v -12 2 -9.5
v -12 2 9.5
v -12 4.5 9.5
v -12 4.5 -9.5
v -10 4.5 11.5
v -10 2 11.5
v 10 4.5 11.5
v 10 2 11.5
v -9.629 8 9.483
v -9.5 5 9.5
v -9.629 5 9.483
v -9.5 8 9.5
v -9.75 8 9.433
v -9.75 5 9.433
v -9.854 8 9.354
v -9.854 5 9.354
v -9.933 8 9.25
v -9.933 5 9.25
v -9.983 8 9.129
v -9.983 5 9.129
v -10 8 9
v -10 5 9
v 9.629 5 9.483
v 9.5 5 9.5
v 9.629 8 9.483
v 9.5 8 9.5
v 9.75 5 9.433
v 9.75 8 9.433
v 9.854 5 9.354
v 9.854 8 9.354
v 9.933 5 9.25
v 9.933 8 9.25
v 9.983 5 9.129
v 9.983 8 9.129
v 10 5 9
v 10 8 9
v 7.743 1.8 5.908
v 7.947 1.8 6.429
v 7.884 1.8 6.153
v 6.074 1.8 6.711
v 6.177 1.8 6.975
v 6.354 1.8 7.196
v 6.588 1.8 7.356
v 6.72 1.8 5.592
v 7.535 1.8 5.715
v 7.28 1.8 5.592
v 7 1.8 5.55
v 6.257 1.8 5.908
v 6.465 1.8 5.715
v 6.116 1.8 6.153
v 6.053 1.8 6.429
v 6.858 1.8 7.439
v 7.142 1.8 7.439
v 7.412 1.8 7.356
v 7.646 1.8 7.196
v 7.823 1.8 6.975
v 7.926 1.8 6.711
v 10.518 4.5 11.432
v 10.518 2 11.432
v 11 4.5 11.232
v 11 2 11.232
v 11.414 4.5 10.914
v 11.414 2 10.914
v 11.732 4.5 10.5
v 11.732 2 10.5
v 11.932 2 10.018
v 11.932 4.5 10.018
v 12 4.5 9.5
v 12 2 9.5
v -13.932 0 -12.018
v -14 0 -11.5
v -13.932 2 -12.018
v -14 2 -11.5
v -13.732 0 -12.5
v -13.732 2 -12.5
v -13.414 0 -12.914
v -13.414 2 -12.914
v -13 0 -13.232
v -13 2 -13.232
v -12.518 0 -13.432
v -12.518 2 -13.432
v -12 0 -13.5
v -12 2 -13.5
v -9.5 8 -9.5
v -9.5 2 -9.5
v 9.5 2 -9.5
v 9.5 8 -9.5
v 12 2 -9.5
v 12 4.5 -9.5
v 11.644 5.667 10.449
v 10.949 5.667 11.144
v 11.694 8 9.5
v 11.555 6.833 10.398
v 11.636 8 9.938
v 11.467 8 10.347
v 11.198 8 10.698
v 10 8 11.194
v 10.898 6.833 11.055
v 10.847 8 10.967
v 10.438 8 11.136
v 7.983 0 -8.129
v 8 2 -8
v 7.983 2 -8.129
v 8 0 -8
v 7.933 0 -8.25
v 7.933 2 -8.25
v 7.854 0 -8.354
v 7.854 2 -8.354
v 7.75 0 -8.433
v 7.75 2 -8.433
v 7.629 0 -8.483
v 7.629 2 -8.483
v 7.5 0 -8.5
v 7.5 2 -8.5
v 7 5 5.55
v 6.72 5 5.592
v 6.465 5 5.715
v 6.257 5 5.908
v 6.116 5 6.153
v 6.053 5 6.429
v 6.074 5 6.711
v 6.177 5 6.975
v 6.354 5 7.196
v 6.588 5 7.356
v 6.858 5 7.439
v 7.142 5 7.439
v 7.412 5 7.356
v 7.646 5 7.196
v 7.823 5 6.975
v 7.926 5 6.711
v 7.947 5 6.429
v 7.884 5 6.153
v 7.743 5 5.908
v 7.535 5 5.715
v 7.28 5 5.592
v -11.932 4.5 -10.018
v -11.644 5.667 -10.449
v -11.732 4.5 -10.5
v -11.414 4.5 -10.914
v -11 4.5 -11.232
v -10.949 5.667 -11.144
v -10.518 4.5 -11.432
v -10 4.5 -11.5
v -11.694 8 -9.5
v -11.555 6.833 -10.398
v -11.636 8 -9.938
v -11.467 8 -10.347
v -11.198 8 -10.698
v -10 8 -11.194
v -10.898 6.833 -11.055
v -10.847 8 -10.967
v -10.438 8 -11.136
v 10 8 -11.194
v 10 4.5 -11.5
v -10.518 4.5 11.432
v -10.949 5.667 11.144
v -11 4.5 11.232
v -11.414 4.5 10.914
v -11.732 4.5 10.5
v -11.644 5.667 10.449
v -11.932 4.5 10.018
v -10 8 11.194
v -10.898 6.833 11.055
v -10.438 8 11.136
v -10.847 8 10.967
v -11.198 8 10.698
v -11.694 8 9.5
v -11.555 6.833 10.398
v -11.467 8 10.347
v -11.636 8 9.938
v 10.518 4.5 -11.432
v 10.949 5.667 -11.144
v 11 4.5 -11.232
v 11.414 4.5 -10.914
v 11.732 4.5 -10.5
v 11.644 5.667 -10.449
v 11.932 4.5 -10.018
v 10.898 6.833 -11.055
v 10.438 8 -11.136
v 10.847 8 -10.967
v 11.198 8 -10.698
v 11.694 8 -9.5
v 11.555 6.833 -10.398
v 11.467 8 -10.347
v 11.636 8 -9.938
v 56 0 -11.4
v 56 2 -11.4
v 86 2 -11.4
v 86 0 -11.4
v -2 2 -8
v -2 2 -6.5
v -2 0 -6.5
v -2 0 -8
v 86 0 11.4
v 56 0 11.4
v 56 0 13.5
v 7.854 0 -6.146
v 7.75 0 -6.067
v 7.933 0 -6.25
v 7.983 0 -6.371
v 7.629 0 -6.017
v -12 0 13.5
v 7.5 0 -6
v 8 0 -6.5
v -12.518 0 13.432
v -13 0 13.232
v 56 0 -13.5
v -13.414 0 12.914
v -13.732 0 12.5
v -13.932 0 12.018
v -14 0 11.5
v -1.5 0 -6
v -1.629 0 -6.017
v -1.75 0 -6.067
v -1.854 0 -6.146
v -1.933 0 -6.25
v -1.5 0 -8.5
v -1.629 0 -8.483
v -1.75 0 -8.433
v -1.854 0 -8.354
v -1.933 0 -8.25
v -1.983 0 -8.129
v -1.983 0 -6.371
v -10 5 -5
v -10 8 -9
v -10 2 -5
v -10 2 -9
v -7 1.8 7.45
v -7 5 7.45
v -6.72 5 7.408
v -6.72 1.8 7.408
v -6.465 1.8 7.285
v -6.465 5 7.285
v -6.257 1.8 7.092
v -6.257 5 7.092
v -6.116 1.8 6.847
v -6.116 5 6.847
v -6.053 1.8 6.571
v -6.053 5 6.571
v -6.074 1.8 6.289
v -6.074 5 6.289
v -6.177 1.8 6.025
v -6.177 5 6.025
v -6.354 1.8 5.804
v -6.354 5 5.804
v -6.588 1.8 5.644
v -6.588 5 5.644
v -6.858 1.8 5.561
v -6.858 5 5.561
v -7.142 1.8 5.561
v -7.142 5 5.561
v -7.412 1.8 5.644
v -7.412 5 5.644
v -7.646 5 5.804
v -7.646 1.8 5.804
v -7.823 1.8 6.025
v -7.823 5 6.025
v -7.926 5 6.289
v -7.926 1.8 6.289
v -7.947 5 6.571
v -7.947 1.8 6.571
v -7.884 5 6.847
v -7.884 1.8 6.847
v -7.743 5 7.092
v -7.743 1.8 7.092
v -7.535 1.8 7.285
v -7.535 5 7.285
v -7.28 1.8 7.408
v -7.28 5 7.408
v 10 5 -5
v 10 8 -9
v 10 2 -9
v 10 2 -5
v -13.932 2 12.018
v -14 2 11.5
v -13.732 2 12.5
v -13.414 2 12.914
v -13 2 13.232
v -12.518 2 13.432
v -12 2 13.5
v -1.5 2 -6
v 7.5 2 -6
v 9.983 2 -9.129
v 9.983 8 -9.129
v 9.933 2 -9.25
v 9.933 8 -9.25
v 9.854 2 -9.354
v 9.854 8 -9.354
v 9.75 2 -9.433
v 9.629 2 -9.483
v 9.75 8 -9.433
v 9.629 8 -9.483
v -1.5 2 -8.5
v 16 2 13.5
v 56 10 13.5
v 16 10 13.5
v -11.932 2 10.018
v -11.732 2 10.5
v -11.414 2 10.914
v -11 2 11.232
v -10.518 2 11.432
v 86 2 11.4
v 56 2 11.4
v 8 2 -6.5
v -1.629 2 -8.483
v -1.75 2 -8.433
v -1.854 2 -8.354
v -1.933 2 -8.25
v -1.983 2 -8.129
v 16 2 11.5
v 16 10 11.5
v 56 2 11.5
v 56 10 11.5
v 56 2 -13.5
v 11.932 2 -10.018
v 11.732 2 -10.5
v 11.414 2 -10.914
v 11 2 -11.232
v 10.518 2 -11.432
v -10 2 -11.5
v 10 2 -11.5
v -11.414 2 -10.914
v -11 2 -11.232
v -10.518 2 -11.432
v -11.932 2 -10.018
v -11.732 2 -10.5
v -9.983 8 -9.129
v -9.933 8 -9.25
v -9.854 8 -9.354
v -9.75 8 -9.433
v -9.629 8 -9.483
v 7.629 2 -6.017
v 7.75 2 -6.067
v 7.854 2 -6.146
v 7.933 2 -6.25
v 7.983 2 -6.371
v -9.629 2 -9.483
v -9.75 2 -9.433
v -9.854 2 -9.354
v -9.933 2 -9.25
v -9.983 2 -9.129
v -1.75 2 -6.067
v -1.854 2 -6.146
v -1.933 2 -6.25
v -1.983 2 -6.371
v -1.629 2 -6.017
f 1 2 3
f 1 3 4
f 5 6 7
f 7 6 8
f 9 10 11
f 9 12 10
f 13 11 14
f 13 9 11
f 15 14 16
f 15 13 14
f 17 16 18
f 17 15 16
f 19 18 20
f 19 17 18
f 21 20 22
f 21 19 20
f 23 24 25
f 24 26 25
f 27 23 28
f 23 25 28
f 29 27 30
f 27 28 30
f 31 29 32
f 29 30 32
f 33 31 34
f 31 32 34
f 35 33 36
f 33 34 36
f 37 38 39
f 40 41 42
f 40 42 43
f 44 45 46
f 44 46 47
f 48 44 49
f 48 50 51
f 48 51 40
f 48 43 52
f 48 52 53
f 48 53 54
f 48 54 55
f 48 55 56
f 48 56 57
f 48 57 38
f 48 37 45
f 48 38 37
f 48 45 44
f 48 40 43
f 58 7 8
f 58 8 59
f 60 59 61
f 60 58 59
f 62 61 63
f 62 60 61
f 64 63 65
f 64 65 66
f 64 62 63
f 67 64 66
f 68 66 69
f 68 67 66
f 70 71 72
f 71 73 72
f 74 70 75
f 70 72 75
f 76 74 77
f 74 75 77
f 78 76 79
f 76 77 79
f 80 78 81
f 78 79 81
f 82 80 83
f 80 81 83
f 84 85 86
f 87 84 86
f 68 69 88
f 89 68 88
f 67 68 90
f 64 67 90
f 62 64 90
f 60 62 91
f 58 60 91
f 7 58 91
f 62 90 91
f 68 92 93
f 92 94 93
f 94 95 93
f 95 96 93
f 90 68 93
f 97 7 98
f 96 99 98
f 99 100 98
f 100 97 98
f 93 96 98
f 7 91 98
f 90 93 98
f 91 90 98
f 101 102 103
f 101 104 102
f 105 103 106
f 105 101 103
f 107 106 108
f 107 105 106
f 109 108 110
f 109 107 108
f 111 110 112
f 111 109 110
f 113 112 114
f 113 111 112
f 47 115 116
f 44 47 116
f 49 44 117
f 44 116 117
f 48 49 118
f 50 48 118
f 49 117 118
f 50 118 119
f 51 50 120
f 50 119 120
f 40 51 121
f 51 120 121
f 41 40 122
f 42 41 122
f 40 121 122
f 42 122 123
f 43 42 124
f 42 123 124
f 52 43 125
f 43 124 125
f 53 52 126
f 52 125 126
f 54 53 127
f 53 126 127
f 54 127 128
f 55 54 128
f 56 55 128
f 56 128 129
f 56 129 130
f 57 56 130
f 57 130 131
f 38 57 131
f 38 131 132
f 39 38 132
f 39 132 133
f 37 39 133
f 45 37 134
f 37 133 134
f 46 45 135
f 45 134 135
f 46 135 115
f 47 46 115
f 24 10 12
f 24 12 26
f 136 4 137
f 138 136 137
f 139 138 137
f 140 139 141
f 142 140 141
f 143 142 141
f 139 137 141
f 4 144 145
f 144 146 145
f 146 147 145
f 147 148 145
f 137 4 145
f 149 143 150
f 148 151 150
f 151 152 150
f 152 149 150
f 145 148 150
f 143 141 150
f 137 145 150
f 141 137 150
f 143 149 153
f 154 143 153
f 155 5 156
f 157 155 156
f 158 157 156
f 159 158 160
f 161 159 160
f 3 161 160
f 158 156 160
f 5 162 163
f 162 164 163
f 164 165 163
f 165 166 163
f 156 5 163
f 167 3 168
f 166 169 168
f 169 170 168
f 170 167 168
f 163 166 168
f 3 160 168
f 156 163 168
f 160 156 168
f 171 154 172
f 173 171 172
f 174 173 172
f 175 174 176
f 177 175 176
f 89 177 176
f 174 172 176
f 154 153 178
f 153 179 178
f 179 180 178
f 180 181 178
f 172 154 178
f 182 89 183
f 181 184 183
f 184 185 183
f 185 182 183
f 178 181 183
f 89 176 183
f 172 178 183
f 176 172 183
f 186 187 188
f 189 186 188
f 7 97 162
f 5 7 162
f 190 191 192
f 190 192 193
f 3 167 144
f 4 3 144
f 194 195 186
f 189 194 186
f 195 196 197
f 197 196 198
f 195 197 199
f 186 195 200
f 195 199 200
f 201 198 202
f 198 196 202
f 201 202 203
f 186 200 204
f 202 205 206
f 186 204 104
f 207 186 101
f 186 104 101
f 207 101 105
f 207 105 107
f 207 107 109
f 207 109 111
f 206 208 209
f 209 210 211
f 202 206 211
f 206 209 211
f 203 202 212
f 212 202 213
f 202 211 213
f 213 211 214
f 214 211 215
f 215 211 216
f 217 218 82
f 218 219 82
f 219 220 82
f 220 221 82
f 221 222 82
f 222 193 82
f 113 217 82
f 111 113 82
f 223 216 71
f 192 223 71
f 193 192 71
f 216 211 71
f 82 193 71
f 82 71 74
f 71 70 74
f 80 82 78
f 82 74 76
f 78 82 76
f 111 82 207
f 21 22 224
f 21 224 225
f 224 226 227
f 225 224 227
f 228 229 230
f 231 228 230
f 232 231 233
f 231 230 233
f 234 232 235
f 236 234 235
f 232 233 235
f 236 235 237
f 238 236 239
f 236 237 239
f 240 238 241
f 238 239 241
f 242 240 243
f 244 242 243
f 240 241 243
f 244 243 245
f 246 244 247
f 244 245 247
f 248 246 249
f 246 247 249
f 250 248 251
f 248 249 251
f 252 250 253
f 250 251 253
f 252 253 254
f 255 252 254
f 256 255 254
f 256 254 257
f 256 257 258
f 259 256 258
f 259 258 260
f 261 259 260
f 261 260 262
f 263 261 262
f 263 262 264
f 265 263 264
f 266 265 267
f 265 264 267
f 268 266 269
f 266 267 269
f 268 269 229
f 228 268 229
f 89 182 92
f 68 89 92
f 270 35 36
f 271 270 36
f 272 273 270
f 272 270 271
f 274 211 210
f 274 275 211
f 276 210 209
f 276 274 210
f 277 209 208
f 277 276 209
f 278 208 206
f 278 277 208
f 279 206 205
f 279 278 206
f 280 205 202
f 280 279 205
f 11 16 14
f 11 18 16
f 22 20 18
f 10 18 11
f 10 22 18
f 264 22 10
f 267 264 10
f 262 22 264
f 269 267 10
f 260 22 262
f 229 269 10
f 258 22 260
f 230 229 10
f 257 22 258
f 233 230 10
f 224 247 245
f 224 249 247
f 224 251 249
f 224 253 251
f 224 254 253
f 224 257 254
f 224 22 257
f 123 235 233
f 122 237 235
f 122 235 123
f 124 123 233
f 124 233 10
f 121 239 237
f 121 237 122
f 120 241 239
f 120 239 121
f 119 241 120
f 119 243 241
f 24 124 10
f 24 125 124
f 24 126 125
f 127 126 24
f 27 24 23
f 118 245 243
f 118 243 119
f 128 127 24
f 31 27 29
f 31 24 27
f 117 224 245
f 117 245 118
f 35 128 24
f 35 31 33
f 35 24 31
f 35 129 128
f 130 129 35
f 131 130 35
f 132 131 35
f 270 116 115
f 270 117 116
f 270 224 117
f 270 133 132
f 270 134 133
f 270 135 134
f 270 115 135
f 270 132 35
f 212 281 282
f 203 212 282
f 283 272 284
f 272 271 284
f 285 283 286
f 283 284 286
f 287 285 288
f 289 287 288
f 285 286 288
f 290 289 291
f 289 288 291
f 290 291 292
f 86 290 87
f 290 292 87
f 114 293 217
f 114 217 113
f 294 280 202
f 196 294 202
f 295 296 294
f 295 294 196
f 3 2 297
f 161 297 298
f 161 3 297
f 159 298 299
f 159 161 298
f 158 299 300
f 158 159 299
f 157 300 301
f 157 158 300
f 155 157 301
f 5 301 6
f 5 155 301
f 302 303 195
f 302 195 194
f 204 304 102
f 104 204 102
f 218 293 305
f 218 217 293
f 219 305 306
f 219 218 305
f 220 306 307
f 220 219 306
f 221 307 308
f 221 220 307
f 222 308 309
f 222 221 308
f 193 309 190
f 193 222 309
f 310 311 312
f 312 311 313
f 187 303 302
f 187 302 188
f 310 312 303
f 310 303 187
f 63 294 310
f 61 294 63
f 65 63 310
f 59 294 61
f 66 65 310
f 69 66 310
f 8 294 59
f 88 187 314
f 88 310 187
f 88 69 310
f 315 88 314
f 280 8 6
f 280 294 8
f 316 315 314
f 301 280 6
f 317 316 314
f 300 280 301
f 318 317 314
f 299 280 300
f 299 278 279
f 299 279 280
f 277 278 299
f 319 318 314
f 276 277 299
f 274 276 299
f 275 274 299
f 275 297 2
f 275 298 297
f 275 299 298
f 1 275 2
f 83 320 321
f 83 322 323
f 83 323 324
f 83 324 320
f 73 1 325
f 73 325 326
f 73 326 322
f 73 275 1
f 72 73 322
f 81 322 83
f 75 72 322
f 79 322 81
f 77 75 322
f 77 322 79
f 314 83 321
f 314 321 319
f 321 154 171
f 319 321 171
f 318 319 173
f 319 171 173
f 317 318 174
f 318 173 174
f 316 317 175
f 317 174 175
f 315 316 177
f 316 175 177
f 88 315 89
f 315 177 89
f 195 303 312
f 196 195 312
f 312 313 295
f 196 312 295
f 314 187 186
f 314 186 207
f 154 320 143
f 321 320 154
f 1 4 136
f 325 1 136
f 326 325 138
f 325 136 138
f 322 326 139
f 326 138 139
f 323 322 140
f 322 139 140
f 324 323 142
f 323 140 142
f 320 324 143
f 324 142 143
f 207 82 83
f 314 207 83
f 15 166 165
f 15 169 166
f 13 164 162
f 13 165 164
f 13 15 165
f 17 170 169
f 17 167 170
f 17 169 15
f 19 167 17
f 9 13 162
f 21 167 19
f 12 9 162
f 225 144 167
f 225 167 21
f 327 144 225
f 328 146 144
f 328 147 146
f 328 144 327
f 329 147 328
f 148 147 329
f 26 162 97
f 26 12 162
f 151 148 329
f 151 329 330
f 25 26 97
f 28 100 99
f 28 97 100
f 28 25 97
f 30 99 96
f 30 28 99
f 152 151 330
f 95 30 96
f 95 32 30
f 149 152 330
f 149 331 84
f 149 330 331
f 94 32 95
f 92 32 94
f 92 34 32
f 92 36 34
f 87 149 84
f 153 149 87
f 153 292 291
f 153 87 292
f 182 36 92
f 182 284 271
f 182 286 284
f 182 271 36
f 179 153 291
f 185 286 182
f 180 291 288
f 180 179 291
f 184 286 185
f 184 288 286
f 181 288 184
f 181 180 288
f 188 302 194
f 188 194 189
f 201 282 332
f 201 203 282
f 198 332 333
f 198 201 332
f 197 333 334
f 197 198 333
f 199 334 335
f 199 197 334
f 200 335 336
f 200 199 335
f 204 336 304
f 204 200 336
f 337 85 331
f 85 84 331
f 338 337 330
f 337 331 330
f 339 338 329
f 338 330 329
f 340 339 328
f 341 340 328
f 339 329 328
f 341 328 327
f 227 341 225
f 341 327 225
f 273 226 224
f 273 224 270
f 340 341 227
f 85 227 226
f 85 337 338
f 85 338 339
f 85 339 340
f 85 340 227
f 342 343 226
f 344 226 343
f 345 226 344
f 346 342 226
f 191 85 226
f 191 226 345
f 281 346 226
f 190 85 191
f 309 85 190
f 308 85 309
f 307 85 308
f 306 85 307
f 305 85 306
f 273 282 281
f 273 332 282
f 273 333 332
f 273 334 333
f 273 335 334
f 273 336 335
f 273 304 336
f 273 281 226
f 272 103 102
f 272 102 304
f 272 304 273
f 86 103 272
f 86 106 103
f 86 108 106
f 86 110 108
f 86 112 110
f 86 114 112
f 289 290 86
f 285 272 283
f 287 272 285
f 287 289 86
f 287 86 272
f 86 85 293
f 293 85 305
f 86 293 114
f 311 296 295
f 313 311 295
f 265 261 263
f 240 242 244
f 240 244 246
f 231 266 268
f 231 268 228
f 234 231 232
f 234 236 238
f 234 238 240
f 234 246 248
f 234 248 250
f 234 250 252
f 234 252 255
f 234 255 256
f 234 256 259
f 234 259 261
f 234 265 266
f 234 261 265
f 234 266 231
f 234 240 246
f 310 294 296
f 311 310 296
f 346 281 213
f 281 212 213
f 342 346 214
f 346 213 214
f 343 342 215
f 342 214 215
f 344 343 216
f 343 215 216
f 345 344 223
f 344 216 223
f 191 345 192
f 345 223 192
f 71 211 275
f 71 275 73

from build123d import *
from OCP.BRepFilletAPI import BRepFilletAPI_MakeChamfer

# Parameters (mm, degrees)
SKETCH1_W           = 28
SKETCH1_H           = 27
BOSS_EXTRUDE1_DEPTH = 2
SKETCH2_W           = 10
SKETCH2_H           = 2.5
CUT_EXTRUDE1_DEPTH  = 2
SKETCH3_W           = 20
SKETCH3_H           = 14.5
BOSS_EXTRUDE2_DEPTH = 3
SKETCH4_W           = 24
SKETCH4_H           = 23
SKETCH4_W_2         = 20
SKETCH4_H_2         = 19
BOSS_EXTRUDE3_DEPTH = 6
SKETCH5_R           = 0.95
CUT_EXTRUDE2_DEPTH  = 3.2
FILLET3_R           = 2
FILLET2_R           = 0.5
SKETCH6_W           = 27
SKETCH6_H           = 2
BOSS_EXTRUDE4_DEPTH = 72
CHAMFER1_SIZE       = 3.5
CHAMFER1_SIZE2      = 0.306210322
SKETCH7_W           = 30
SKETCH7_H           = 2.1
CUT_EXTRUDE3_DEPTH  = 88.259669951
SKETCH8_W           = 40
SKETCH8_H           = 8
BOSS_EXTRUDE5_DEPTH = 2


with BuildPart() as part:
    # Sketch1 → Boss-Extrude1 (new body)
    with BuildSketch(Plane(origin=(0, 0, 0), x_dir=(1, 0, 0), z_dir=(0, 1, 0))):
        Rectangle(SKETCH1_W, SKETCH1_H)
    extrude(amount=BOSS_EXTRUDE1_DEPTH)

    # Sketch2 → Cut-Extrude1 (cut)
    with BuildSketch(Plane(origin=(0, 2, 0), x_dir=(1, 0, 0), z_dir=(0, 1, 0))):
        with Locations((3, 7.25)):
            Rectangle(SKETCH2_W, SKETCH2_H)
    extrude(amount=-CUT_EXTRUDE1_DEPTH, mode=Mode.SUBTRACT)

    # Sketch3 → Boss-Extrude2 (add)
    with BuildSketch(Plane(origin=(0, 2, 0), x_dir=(1, 0, 0), z_dir=(0, 1, 0))):
        with Locations((0, -2.25)):
            Rectangle(SKETCH3_W, SKETCH3_H)
    extrude(amount=BOSS_EXTRUDE2_DEPTH)

    # Sketch4 → Boss-Extrude3 (add)
    with BuildSketch(Plane(origin=(0, 2, 0), x_dir=(1, 0, 0), z_dir=(0, 1, 0))):
        Rectangle(SKETCH4_W, SKETCH4_H)
        Rectangle(SKETCH4_W_2, SKETCH4_H_2, mode=Mode.SUBTRACT)
    extrude(amount=BOSS_EXTRUDE3_DEPTH)

    # Sketch5 → Cut-Extrude2 (cut)
    with BuildSketch(Plane(origin=(0, 5, 0), x_dir=(1, 0, 0), z_dir=(0, 1, 0))):
        with Locations(Location((-7, -6.5, 0), (0, 0, 270))):
            Circle(SKETCH5_R)
        with Locations(Location((7, -6.5, 0), (0, 0, 90))):
            Circle(SKETCH5_R)
    extrude(amount=-CUT_EXTRUDE2_DEPTH, mode=Mode.SUBTRACT)

    # Fillet3
    fillet3_edges = [part.edges().sort_by_distance(p)[0] for p in [
        (12, 5, -11.5),
        (-12, 5, -11.5),
        (-12, 5, 11.5),
        (12, 5, 11.5),
        (-14, 1, 13.5),
        (-14, 1, -13.5),
    ]]
    fillet(fillet3_edges, radius=FILLET3_R)

    # Fillet2
    fillet2_edges = [part.edges().sort_by_distance(p)[0] for p in [
        (-2, 1, -8.5),
        (-2, 1, -6),
        (8, 1, -6),
        (8, 1, -8.5),
        (10, 5, -9.5),
        (-10, 6.5, 9.5),
        (10, 6.5, 9.5),
        (-10, 5, -9.5),
    ]]
    fillet(fillet2_edges, radius=FILLET2_R)

    # Sketch6 → Boss-Extrude4 (add)
    with BuildSketch(Plane(origin=(14, 0, 0), x_dir=(0, 0, -1), z_dir=(1, 0, 0))):
        with Locations((0, 1)):
            Rectangle(SKETCH6_W, SKETCH6_H)
    extrude(amount=BOSS_EXTRUDE4_DEPTH)

    # Chamfer1: one chamfer whose edges measure the first distance from different faces: ONE call of the kernel's chamfer builder (chamfer() names one face for all edges)
    chamfer1_edges_1 = [part.edges().sort_by_distance(p)[0] for p in [
        (0, 8, -11.5),
    ]]
    chamfer1_side_1 = [part.faces().sort_by_distance(p)[0] for p in [
        (0, 5, -11.5),
    ]]
    chamfer1_edges_2 = [part.edges().sort_by_distance(p)[0] for p in [
        (12, 8, 0),
    ]]
    chamfer1_side_2 = [part.faces().sort_by_distance(p)[0] for p in [
        (12, 5, 0),
    ]]
    chamfer1_edges_3 = [part.edges().sort_by_distance(p)[0] for p in [
        (-12, 8, 0),
    ]]
    chamfer1_side_3 = [part.faces().sort_by_distance(p)[0] for p in [
        (-12, 5, 0),
    ]]
    chamfer1_edges_4 = [part.edges().sort_by_distance(p)[0] for p in [
        (0, 8, 11.5),
    ]]
    chamfer1_side_4 = [part.faces().sort_by_distance(p)[0] for p in [
        (0, 5, 11.5),
    ]]
    chamfer1_edges_5 = [part.edges().sort_by_distance(p)[0] for p in [
        (-11.414213562, 8, -10.914213562),
    ]]
    chamfer1_side_5 = [part.faces().sort_by_distance(p)[0] for p in [
        (-11.414213562, 5, -10.914213562),
    ]]
    chamfer1_edges_6 = [part.edges().sort_by_distance(p)[0] for p in [
        (-11.414213562, 8, 10.914213562),
    ]]
    chamfer1_side_6 = [part.faces().sort_by_distance(p)[0] for p in [
        (-11.414213562, 5, 10.914213562),
    ]]
    chamfer1_edges_7 = [part.edges().sort_by_distance(p)[0] for p in [
        (11.414213562, 8, 10.914213562),
    ]]
    chamfer1_side_7 = [part.faces().sort_by_distance(p)[0] for p in [
        (11.414213562, 5, 10.914213562),
    ]]
    chamfer1_edges_8 = [part.edges().sort_by_distance(p)[0] for p in [
        (11.414213562, 8, -10.914213562),
    ]]
    chamfer1_side_8 = [part.faces().sort_by_distance(p)[0] for p in [
        (11.414213562, 5, -10.914213562),
    ]]
    chamfer1 = BRepFilletAPI_MakeChamfer(part.part.solid().wrapped)
    for e in chamfer1_edges_1:
        chamfer1.Add(CHAMFER1_SIZE, CHAMFER1_SIZE2, e.wrapped, chamfer1_side_1[0].wrapped)  # the first distance lies on this face
    for e in chamfer1_edges_2:
        chamfer1.Add(CHAMFER1_SIZE, CHAMFER1_SIZE2, e.wrapped, chamfer1_side_2[0].wrapped)  # the first distance lies on this face
    for e in chamfer1_edges_3:
        chamfer1.Add(CHAMFER1_SIZE, CHAMFER1_SIZE2, e.wrapped, chamfer1_side_3[0].wrapped)  # the first distance lies on this face
    for e in chamfer1_edges_4:
        chamfer1.Add(CHAMFER1_SIZE, CHAMFER1_SIZE2, e.wrapped, chamfer1_side_4[0].wrapped)  # the first distance lies on this face
    for e in chamfer1_edges_5:
        chamfer1.Add(CHAMFER1_SIZE, CHAMFER1_SIZE2, e.wrapped, chamfer1_side_5[0].wrapped)  # the first distance lies on this face
    for e in chamfer1_edges_6:
        chamfer1.Add(CHAMFER1_SIZE, CHAMFER1_SIZE2, e.wrapped, chamfer1_side_6[0].wrapped)  # the first distance lies on this face
    for e in chamfer1_edges_7:
        chamfer1.Add(CHAMFER1_SIZE, CHAMFER1_SIZE2, e.wrapped, chamfer1_side_7[0].wrapped)  # the first distance lies on this face
    for e in chamfer1_edges_8:
        chamfer1.Add(CHAMFER1_SIZE, CHAMFER1_SIZE2, e.wrapped, chamfer1_side_8[0].wrapped)  # the first distance lies on this face
    add(Compound.cast(chamfer1.Shape()), mode=Mode.REPLACE)

    # Sketch7 → Cut-Extrude3 (cut, through all)
    with BuildSketch(Plane(origin=(0, 2, 0), x_dir=(1, 0, 0), z_dir=(0, 1, 0))):
        with Locations((71, 12.45)):
            Rectangle(SKETCH7_W, SKETCH7_H)
    cut_extrude3 = extrude(amount=-CUT_EXTRUDE3_DEPTH, mode=Mode.SUBTRACT)

    # Mirror1: Cut-Extrude3 across plane
    add(cut_extrude3.mirror(Plane.XY), mode=Mode.SUBTRACT)

    # Sketch8 → Boss-Extrude5 (add)
    with BuildSketch(Plane.XY.offset(13.5)):
        with Locations((36, 6)):
            Rectangle(SKETCH8_W, SKETCH8_H)
    extrude(amount=-BOSS_EXTRUDE5_DEPTH)


solid = part.part
